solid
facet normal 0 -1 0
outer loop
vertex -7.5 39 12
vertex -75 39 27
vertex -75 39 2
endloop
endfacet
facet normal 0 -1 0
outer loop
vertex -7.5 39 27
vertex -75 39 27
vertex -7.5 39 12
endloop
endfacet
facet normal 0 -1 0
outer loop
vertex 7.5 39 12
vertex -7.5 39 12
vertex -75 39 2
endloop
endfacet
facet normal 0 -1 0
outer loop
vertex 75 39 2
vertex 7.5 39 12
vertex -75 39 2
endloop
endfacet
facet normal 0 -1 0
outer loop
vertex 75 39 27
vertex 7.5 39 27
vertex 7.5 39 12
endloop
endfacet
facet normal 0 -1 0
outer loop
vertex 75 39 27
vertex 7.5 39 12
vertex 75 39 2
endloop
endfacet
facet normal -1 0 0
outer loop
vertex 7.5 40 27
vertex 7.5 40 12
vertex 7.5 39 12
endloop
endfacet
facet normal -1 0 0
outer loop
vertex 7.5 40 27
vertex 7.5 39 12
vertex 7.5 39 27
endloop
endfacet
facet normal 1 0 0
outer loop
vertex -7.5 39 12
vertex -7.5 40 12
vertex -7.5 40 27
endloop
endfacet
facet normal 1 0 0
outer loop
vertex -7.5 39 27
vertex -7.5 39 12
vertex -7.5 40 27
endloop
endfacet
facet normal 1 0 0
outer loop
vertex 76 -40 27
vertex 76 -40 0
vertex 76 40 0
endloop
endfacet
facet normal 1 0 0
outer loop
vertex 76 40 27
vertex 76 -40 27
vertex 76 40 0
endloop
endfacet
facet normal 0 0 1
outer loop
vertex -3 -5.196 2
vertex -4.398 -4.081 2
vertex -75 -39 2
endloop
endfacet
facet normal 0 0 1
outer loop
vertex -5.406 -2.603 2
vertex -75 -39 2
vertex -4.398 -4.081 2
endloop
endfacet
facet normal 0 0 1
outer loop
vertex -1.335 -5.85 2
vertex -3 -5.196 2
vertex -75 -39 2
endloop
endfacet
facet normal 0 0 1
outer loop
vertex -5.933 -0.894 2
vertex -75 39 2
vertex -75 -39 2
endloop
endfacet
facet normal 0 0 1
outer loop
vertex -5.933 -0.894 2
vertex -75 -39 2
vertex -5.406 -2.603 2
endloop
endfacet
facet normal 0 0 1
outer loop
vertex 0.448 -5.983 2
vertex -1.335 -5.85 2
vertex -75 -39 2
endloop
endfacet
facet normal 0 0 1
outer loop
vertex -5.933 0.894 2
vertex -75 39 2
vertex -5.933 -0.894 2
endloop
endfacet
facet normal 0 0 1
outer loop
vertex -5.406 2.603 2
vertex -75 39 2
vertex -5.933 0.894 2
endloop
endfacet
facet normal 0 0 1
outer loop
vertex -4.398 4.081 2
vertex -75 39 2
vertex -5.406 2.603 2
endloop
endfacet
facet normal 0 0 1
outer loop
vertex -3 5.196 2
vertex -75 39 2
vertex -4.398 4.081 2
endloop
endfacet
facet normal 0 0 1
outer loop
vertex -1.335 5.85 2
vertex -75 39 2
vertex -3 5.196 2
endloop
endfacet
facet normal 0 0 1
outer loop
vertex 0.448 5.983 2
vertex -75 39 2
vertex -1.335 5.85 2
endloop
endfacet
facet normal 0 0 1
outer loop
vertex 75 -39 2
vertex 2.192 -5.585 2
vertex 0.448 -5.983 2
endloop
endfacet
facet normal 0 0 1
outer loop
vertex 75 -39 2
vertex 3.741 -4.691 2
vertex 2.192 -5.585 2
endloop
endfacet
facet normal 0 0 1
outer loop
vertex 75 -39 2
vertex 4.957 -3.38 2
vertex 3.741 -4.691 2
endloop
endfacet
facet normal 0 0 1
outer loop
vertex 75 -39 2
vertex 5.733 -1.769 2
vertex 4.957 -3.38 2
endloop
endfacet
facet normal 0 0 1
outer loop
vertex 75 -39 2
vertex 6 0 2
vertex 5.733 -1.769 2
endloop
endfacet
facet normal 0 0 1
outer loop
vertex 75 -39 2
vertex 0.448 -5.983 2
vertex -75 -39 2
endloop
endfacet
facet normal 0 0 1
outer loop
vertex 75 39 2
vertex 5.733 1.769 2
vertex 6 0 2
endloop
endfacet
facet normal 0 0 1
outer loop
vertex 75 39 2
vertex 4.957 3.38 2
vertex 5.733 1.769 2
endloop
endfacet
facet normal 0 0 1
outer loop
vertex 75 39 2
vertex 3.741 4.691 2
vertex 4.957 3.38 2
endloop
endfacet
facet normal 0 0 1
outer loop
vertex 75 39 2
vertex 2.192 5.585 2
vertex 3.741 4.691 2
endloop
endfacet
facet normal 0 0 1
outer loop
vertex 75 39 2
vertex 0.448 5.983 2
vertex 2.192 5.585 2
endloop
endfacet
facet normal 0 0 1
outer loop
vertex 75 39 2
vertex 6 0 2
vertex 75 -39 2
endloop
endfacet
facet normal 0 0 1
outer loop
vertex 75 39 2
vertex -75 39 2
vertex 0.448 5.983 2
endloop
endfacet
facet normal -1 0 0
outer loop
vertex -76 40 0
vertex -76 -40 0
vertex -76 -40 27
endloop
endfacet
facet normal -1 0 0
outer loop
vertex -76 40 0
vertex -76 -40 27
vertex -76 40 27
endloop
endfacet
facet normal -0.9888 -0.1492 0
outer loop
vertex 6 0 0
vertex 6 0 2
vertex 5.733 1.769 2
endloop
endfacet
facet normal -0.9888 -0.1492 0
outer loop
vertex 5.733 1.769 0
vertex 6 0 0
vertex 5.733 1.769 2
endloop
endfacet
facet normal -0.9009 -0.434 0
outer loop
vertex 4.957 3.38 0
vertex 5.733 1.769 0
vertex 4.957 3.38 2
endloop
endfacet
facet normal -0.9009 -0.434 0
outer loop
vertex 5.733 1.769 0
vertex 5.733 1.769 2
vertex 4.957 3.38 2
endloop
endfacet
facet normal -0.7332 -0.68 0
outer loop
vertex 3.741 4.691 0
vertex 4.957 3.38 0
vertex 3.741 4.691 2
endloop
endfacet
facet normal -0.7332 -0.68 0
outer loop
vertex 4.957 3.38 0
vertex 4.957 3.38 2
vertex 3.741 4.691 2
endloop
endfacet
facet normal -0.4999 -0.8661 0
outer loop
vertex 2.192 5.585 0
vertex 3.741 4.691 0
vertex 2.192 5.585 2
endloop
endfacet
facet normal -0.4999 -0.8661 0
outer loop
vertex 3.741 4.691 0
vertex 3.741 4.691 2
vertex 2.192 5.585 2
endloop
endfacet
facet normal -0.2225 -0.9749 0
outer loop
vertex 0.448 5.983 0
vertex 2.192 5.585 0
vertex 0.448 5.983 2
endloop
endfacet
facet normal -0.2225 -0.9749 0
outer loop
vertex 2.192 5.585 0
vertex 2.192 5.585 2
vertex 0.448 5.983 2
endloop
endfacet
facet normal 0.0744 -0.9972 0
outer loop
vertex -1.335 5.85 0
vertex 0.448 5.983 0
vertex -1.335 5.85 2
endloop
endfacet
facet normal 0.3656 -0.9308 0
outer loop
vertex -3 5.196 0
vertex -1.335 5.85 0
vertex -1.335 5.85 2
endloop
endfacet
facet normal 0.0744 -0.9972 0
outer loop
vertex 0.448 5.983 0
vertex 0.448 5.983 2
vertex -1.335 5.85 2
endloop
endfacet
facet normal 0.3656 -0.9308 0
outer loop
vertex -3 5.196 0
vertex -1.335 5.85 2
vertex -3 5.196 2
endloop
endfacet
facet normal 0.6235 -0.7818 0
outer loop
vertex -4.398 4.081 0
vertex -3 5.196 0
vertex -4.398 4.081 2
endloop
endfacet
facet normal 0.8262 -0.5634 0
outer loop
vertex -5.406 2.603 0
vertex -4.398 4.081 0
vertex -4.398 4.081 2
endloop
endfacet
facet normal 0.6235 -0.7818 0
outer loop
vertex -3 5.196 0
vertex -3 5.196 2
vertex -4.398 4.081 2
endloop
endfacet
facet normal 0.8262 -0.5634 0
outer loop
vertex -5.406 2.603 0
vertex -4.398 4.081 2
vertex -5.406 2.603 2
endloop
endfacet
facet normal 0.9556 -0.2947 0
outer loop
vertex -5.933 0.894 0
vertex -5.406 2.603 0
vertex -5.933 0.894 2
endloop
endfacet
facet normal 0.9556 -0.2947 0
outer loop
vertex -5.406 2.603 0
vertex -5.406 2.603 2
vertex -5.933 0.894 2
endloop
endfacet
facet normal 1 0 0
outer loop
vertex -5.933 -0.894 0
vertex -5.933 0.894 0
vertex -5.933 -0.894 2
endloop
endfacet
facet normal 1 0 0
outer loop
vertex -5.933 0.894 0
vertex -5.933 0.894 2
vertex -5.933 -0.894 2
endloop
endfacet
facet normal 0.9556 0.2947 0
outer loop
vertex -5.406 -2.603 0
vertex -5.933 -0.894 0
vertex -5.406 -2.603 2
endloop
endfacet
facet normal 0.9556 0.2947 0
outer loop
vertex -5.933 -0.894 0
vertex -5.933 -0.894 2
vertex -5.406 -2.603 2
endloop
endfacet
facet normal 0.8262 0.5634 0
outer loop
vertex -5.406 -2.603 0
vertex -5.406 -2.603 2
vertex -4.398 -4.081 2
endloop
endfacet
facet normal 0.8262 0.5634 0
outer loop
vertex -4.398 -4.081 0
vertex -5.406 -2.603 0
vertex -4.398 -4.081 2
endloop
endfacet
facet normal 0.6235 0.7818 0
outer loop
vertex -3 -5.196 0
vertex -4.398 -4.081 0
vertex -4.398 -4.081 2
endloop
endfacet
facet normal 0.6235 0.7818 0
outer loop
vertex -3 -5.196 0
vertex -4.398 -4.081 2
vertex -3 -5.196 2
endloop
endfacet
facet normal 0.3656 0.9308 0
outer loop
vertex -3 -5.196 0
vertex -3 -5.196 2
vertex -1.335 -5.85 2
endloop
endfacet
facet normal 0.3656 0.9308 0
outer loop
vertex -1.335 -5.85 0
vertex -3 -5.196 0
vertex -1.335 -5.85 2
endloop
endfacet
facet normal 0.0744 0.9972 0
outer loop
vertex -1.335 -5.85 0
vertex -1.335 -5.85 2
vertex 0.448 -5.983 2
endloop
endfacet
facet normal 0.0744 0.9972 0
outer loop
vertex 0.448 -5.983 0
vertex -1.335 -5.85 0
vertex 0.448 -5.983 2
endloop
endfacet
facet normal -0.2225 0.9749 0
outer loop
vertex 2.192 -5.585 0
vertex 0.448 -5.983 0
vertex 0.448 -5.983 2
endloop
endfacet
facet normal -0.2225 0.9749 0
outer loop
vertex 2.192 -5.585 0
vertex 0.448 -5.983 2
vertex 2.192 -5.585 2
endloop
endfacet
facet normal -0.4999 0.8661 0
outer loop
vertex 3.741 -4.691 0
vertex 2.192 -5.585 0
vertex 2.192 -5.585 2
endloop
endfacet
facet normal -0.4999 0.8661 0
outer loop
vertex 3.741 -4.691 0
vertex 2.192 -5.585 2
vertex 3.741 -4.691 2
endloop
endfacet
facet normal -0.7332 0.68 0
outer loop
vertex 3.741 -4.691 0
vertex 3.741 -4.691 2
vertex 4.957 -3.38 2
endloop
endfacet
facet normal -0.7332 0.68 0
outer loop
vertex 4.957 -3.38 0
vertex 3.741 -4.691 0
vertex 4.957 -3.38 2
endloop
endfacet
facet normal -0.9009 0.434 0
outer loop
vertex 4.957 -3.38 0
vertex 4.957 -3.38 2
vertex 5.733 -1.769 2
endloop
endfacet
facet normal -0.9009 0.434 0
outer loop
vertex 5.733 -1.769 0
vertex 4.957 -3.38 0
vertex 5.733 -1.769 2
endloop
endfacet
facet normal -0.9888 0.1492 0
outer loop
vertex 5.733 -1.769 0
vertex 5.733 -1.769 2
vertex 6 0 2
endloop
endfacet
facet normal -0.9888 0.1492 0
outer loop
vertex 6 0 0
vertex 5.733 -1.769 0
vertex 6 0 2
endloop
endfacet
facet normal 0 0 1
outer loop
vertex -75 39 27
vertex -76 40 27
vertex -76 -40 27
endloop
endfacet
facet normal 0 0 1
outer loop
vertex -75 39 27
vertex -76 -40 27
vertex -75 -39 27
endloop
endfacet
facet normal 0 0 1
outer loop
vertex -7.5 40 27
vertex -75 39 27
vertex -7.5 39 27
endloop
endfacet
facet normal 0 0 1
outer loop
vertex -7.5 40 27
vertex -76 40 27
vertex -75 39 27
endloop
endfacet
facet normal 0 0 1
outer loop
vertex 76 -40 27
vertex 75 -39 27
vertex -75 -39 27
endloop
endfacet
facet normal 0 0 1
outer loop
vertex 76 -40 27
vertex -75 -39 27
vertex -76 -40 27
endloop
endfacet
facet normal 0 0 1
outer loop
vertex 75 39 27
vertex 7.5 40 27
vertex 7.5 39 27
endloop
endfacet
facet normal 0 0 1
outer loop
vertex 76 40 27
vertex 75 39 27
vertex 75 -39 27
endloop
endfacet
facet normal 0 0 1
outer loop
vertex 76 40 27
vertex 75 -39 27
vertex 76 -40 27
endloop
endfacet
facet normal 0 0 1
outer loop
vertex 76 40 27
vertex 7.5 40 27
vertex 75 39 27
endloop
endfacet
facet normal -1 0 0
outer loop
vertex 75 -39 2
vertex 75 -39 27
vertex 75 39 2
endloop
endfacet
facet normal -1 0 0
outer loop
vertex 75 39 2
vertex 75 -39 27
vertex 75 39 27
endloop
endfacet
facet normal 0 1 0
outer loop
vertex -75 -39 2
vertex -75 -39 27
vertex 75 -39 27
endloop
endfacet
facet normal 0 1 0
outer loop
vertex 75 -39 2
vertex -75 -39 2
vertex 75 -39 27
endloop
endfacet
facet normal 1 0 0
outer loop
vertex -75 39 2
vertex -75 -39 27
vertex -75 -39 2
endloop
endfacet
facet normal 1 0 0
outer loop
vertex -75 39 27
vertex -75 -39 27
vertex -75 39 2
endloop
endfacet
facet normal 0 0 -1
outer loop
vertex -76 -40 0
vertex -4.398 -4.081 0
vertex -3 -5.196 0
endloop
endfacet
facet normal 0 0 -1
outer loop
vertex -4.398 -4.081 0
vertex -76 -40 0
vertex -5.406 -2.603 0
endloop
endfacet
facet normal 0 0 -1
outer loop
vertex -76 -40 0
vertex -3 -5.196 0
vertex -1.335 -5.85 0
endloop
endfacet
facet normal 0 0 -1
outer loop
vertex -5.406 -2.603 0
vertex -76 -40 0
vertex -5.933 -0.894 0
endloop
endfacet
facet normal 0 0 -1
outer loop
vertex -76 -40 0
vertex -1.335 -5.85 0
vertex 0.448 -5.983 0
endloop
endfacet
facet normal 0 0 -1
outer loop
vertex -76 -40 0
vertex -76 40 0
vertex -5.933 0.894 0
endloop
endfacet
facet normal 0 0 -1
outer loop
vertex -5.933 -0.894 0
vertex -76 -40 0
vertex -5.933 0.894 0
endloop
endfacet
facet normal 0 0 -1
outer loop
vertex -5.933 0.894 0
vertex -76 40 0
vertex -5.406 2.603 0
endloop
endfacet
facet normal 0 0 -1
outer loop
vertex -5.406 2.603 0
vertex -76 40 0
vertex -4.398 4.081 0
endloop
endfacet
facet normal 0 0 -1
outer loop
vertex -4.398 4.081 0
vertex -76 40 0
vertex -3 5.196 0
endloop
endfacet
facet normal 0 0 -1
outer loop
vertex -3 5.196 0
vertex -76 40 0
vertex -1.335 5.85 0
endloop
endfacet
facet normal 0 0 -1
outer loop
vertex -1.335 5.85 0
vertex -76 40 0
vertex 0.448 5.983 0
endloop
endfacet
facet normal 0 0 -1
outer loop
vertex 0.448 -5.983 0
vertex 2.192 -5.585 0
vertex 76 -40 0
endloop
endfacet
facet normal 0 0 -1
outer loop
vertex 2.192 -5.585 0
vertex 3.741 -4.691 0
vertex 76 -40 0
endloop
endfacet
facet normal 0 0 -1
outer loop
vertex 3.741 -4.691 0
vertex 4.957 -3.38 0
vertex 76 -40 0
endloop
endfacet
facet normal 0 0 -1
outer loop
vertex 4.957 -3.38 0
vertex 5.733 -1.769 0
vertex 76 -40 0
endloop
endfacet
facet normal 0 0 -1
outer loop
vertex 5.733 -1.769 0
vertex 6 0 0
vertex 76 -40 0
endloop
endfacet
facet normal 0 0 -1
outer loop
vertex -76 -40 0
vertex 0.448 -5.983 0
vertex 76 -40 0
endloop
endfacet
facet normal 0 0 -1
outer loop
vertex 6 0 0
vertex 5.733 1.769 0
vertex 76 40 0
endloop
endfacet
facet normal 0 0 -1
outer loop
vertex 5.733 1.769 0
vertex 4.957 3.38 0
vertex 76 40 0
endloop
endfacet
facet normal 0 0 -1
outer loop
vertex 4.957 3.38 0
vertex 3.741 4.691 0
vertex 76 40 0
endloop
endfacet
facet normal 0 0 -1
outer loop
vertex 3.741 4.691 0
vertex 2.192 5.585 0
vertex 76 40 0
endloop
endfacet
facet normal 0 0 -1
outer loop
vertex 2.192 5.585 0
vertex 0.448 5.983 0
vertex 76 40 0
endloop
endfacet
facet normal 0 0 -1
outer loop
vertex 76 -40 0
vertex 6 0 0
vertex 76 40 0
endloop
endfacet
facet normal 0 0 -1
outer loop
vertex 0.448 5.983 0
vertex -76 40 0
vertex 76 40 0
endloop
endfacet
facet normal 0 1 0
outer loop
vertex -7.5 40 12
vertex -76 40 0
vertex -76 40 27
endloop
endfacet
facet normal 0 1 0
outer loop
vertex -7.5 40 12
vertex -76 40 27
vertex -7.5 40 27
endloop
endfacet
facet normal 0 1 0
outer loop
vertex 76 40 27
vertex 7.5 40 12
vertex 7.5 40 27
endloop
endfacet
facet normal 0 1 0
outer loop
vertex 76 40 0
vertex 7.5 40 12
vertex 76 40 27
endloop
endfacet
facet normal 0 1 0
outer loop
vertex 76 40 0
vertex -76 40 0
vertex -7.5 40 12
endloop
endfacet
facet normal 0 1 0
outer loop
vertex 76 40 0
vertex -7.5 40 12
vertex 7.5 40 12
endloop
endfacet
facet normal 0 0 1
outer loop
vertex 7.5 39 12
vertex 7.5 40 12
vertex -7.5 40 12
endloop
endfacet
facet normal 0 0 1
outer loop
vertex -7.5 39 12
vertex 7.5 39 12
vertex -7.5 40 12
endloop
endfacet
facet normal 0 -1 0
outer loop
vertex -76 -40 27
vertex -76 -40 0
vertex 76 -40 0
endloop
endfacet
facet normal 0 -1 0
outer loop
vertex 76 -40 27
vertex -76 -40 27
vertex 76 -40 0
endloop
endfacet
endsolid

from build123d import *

# Parameters (mm, degrees)
F0_W     = 152
F0_H     = 80
F1_DEPTH = 27
F2_W     = 150
F2_H     = 78
F3_DEPTH = 25
F4_R     = 6
F5_DEPTH = 5
F6_W     = 15
F6_H     = 15
F7_DEPTH = 1


with BuildPart() as f1:
    # F0 (on Top) → F1 (new body)
    with BuildSketch(Plane.XY):
        Rectangle(F0_W, F0_H)
    extrude(amount=F1_DEPTH)

    # F2 (on face) → F3 (cut)
    with BuildSketch(Plane.XY.offset(27)):
        Rectangle(F2_W, F2_H)
    extrude(amount=-F3_DEPTH, mode=Mode.SUBTRACT)

    # F4 (on face) → F5 (cut)
    with BuildSketch(Plane.XY.offset(2)):
        Circle(F4_R)
    extrude(amount=-F5_DEPTH, mode=Mode.SUBTRACT)

    # F6 (on face) → F7 (cut)
    with BuildSketch(Plane(origin=(0, 40, 0), x_dir=(-1, 0, 0), z_dir=(0, 1, 0))):
        with Locations((0, 19.5)):
            Rectangle(F6_W, F6_H)
    extrude(amount=-F7_DEPTH, mode=Mode.SUBTRACT)


solid = f1.part
